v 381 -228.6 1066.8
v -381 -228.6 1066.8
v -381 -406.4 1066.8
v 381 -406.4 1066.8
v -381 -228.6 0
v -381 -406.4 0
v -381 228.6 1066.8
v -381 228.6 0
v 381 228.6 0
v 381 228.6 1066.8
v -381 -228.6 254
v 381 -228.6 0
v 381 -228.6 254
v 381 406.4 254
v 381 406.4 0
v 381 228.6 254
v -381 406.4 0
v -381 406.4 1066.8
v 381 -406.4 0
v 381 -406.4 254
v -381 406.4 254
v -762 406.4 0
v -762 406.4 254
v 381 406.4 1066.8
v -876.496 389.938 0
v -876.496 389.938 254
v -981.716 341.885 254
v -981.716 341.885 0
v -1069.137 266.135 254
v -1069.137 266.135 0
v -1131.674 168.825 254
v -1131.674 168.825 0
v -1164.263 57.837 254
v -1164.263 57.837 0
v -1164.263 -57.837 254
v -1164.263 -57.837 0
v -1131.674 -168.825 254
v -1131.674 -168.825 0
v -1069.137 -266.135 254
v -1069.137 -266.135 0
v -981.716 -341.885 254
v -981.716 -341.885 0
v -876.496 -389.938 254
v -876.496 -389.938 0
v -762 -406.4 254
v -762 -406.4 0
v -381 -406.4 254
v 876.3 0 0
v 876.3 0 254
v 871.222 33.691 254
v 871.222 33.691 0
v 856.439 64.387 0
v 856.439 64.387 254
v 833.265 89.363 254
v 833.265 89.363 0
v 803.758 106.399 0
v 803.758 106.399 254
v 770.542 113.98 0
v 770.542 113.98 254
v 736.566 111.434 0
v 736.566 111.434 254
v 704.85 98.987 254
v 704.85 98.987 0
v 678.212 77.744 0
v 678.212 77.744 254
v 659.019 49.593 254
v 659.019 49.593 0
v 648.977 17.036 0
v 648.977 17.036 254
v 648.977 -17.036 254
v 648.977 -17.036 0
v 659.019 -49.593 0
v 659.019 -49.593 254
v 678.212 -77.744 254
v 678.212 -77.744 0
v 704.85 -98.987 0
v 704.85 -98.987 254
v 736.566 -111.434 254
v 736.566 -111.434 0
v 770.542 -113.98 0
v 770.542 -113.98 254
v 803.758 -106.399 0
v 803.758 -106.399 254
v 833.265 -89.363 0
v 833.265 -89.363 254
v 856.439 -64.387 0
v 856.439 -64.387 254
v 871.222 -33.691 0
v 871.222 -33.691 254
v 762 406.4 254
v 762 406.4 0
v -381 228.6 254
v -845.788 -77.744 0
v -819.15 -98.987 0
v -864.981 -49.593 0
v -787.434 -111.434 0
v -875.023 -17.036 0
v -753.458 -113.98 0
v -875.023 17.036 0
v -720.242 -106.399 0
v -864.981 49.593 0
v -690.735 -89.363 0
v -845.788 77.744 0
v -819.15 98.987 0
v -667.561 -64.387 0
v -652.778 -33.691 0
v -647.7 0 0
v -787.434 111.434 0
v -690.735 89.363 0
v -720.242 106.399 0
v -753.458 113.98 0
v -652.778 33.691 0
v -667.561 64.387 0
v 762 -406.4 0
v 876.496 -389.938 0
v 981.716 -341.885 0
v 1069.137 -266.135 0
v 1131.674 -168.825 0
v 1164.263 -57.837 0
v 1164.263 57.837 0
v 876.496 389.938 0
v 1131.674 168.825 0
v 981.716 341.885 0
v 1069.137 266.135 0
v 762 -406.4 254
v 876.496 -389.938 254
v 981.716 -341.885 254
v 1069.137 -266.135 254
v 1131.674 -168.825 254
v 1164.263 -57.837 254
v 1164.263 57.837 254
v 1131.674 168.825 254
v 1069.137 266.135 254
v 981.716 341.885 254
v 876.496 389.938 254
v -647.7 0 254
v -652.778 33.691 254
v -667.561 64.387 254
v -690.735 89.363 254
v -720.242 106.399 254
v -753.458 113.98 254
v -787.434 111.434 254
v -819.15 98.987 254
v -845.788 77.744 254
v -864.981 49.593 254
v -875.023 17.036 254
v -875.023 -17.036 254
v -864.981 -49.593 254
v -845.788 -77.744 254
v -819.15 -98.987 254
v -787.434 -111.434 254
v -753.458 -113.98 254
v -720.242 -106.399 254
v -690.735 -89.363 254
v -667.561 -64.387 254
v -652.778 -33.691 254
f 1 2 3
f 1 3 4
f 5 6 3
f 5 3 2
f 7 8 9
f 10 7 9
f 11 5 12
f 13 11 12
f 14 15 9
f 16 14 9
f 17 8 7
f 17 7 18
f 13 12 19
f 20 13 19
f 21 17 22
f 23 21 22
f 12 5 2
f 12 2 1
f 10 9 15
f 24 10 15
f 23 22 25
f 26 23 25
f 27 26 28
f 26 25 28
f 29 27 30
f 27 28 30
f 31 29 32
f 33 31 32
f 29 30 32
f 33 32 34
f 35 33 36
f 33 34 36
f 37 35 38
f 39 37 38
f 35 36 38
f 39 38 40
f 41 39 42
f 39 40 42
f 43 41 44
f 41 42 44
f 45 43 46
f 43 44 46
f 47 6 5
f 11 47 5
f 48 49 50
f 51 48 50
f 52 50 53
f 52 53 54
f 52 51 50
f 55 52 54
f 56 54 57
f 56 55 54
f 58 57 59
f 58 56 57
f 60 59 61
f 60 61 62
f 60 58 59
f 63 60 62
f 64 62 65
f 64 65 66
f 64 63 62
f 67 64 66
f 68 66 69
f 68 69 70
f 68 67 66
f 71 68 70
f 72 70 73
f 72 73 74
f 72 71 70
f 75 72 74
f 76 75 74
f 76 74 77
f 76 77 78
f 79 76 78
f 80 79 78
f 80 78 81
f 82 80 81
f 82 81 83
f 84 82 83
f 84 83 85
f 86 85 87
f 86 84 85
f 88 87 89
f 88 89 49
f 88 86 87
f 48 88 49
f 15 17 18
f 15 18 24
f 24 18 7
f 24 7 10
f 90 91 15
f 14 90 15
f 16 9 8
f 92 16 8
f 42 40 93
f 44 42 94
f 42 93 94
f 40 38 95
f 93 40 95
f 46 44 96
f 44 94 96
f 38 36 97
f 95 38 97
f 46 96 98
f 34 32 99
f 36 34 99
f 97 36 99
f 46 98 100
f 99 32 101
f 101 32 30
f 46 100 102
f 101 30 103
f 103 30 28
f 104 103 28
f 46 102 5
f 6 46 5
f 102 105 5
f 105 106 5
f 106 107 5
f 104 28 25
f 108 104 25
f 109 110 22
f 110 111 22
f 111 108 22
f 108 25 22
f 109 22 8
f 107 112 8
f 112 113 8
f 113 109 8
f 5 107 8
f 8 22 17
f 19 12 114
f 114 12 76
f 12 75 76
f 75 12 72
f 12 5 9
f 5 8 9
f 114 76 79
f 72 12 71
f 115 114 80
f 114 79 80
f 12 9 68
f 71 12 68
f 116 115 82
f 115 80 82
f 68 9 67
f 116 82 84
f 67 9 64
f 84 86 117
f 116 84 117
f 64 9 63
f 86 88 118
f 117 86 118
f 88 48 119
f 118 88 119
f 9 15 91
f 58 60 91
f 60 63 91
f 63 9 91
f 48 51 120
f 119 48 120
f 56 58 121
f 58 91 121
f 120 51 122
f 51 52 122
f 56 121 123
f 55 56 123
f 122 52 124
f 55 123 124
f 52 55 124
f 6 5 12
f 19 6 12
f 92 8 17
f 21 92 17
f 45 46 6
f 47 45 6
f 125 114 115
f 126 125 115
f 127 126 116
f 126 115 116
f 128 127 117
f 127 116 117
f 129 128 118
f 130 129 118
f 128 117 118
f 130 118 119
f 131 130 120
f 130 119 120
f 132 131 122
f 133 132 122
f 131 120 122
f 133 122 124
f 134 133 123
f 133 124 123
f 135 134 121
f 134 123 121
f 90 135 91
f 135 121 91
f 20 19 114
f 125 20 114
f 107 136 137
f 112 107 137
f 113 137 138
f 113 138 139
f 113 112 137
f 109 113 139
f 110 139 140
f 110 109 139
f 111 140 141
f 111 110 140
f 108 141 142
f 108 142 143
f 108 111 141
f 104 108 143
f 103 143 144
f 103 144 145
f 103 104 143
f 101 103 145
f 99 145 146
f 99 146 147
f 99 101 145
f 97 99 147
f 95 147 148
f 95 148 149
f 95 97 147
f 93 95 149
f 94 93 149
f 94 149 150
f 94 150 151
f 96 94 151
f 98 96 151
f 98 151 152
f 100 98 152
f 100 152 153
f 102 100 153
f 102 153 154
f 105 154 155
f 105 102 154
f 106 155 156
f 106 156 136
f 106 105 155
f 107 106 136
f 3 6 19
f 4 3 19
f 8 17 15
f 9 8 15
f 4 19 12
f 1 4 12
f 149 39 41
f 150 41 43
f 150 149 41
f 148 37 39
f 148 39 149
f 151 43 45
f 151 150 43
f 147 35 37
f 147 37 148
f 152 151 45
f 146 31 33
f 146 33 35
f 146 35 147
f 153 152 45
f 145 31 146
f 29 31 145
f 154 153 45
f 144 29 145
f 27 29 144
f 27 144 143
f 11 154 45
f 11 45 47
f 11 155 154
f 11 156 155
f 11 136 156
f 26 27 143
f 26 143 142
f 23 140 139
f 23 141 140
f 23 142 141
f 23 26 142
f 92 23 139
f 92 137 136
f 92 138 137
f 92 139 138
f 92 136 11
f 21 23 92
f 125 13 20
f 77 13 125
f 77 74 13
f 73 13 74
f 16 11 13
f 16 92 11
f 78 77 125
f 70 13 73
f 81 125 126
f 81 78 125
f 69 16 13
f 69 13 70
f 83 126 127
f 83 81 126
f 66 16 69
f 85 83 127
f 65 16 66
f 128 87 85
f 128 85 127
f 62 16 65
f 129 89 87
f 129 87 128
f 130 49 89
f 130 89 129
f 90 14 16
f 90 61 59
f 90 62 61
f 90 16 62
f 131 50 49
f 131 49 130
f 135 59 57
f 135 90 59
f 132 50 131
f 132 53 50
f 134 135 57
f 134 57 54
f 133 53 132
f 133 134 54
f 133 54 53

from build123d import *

# Parameters (mm, degrees)
F0_W     = 762
F0_H     = 177.8
F1_DEPTH = 1066.8
F2_DEPTH = 1066.8
F0_R     = 114.3
F3_DEPTH = 254


with BuildPart() as f1:
    # F0 (on Top) → F1 (new body)
    with BuildSketch(Plane.XY):
        with Locations((0, -317.5)):
            Rectangle(F0_W, F0_H)
    extrude(amount=F1_DEPTH)


with BuildPart() as f2:
    # F0 (on Top) → F2 (new body)
    with BuildSketch(Plane.XY):
        with Locations((0, 317.5)):
            Rectangle(F0_W, F0_H)
    extrude(amount=F2_DEPTH)


with BuildPart() as f3:
    # F0 (on Top) → F3 (new body)
    with BuildSketch(Plane.XY):
        with BuildLine():
            ThreePointArc((762, -406.4), (1168.4, 0), (762, 406.4))
            Line((762, 406.4), (381, 406.4))
            Line((381, 406.4), (381, 228.6))
            Line((381, 228.6), (-381, 228.6))
            Line((-381, 228.6), (-381, 406.4))
            Line((-381, 406.4), (-762, 406.4))
            ThreePointArc((-762, 406.4), (-1168.4, 0), (-762, -406.4))
            Line((-762, -406.4), (-381, -406.4))
            Line((-381, -406.4), (-381, -228.6))
            Line((-381, -228.6), (381, -228.6))
            Line((381, -228.6), (381, -406.4))
            Line((381, -406.4), (762, -406.4))
        make_face()
        with Locations((-762, 0)):
            Circle(F0_R, mode=Mode.SUBTRACT)
        with Locations((762, 0)):
            Circle(F0_R, mode=Mode.SUBTRACT)
    extrude(amount=F3_DEPTH)


solid = Compound([f1.part, f2.part, f3.part])
